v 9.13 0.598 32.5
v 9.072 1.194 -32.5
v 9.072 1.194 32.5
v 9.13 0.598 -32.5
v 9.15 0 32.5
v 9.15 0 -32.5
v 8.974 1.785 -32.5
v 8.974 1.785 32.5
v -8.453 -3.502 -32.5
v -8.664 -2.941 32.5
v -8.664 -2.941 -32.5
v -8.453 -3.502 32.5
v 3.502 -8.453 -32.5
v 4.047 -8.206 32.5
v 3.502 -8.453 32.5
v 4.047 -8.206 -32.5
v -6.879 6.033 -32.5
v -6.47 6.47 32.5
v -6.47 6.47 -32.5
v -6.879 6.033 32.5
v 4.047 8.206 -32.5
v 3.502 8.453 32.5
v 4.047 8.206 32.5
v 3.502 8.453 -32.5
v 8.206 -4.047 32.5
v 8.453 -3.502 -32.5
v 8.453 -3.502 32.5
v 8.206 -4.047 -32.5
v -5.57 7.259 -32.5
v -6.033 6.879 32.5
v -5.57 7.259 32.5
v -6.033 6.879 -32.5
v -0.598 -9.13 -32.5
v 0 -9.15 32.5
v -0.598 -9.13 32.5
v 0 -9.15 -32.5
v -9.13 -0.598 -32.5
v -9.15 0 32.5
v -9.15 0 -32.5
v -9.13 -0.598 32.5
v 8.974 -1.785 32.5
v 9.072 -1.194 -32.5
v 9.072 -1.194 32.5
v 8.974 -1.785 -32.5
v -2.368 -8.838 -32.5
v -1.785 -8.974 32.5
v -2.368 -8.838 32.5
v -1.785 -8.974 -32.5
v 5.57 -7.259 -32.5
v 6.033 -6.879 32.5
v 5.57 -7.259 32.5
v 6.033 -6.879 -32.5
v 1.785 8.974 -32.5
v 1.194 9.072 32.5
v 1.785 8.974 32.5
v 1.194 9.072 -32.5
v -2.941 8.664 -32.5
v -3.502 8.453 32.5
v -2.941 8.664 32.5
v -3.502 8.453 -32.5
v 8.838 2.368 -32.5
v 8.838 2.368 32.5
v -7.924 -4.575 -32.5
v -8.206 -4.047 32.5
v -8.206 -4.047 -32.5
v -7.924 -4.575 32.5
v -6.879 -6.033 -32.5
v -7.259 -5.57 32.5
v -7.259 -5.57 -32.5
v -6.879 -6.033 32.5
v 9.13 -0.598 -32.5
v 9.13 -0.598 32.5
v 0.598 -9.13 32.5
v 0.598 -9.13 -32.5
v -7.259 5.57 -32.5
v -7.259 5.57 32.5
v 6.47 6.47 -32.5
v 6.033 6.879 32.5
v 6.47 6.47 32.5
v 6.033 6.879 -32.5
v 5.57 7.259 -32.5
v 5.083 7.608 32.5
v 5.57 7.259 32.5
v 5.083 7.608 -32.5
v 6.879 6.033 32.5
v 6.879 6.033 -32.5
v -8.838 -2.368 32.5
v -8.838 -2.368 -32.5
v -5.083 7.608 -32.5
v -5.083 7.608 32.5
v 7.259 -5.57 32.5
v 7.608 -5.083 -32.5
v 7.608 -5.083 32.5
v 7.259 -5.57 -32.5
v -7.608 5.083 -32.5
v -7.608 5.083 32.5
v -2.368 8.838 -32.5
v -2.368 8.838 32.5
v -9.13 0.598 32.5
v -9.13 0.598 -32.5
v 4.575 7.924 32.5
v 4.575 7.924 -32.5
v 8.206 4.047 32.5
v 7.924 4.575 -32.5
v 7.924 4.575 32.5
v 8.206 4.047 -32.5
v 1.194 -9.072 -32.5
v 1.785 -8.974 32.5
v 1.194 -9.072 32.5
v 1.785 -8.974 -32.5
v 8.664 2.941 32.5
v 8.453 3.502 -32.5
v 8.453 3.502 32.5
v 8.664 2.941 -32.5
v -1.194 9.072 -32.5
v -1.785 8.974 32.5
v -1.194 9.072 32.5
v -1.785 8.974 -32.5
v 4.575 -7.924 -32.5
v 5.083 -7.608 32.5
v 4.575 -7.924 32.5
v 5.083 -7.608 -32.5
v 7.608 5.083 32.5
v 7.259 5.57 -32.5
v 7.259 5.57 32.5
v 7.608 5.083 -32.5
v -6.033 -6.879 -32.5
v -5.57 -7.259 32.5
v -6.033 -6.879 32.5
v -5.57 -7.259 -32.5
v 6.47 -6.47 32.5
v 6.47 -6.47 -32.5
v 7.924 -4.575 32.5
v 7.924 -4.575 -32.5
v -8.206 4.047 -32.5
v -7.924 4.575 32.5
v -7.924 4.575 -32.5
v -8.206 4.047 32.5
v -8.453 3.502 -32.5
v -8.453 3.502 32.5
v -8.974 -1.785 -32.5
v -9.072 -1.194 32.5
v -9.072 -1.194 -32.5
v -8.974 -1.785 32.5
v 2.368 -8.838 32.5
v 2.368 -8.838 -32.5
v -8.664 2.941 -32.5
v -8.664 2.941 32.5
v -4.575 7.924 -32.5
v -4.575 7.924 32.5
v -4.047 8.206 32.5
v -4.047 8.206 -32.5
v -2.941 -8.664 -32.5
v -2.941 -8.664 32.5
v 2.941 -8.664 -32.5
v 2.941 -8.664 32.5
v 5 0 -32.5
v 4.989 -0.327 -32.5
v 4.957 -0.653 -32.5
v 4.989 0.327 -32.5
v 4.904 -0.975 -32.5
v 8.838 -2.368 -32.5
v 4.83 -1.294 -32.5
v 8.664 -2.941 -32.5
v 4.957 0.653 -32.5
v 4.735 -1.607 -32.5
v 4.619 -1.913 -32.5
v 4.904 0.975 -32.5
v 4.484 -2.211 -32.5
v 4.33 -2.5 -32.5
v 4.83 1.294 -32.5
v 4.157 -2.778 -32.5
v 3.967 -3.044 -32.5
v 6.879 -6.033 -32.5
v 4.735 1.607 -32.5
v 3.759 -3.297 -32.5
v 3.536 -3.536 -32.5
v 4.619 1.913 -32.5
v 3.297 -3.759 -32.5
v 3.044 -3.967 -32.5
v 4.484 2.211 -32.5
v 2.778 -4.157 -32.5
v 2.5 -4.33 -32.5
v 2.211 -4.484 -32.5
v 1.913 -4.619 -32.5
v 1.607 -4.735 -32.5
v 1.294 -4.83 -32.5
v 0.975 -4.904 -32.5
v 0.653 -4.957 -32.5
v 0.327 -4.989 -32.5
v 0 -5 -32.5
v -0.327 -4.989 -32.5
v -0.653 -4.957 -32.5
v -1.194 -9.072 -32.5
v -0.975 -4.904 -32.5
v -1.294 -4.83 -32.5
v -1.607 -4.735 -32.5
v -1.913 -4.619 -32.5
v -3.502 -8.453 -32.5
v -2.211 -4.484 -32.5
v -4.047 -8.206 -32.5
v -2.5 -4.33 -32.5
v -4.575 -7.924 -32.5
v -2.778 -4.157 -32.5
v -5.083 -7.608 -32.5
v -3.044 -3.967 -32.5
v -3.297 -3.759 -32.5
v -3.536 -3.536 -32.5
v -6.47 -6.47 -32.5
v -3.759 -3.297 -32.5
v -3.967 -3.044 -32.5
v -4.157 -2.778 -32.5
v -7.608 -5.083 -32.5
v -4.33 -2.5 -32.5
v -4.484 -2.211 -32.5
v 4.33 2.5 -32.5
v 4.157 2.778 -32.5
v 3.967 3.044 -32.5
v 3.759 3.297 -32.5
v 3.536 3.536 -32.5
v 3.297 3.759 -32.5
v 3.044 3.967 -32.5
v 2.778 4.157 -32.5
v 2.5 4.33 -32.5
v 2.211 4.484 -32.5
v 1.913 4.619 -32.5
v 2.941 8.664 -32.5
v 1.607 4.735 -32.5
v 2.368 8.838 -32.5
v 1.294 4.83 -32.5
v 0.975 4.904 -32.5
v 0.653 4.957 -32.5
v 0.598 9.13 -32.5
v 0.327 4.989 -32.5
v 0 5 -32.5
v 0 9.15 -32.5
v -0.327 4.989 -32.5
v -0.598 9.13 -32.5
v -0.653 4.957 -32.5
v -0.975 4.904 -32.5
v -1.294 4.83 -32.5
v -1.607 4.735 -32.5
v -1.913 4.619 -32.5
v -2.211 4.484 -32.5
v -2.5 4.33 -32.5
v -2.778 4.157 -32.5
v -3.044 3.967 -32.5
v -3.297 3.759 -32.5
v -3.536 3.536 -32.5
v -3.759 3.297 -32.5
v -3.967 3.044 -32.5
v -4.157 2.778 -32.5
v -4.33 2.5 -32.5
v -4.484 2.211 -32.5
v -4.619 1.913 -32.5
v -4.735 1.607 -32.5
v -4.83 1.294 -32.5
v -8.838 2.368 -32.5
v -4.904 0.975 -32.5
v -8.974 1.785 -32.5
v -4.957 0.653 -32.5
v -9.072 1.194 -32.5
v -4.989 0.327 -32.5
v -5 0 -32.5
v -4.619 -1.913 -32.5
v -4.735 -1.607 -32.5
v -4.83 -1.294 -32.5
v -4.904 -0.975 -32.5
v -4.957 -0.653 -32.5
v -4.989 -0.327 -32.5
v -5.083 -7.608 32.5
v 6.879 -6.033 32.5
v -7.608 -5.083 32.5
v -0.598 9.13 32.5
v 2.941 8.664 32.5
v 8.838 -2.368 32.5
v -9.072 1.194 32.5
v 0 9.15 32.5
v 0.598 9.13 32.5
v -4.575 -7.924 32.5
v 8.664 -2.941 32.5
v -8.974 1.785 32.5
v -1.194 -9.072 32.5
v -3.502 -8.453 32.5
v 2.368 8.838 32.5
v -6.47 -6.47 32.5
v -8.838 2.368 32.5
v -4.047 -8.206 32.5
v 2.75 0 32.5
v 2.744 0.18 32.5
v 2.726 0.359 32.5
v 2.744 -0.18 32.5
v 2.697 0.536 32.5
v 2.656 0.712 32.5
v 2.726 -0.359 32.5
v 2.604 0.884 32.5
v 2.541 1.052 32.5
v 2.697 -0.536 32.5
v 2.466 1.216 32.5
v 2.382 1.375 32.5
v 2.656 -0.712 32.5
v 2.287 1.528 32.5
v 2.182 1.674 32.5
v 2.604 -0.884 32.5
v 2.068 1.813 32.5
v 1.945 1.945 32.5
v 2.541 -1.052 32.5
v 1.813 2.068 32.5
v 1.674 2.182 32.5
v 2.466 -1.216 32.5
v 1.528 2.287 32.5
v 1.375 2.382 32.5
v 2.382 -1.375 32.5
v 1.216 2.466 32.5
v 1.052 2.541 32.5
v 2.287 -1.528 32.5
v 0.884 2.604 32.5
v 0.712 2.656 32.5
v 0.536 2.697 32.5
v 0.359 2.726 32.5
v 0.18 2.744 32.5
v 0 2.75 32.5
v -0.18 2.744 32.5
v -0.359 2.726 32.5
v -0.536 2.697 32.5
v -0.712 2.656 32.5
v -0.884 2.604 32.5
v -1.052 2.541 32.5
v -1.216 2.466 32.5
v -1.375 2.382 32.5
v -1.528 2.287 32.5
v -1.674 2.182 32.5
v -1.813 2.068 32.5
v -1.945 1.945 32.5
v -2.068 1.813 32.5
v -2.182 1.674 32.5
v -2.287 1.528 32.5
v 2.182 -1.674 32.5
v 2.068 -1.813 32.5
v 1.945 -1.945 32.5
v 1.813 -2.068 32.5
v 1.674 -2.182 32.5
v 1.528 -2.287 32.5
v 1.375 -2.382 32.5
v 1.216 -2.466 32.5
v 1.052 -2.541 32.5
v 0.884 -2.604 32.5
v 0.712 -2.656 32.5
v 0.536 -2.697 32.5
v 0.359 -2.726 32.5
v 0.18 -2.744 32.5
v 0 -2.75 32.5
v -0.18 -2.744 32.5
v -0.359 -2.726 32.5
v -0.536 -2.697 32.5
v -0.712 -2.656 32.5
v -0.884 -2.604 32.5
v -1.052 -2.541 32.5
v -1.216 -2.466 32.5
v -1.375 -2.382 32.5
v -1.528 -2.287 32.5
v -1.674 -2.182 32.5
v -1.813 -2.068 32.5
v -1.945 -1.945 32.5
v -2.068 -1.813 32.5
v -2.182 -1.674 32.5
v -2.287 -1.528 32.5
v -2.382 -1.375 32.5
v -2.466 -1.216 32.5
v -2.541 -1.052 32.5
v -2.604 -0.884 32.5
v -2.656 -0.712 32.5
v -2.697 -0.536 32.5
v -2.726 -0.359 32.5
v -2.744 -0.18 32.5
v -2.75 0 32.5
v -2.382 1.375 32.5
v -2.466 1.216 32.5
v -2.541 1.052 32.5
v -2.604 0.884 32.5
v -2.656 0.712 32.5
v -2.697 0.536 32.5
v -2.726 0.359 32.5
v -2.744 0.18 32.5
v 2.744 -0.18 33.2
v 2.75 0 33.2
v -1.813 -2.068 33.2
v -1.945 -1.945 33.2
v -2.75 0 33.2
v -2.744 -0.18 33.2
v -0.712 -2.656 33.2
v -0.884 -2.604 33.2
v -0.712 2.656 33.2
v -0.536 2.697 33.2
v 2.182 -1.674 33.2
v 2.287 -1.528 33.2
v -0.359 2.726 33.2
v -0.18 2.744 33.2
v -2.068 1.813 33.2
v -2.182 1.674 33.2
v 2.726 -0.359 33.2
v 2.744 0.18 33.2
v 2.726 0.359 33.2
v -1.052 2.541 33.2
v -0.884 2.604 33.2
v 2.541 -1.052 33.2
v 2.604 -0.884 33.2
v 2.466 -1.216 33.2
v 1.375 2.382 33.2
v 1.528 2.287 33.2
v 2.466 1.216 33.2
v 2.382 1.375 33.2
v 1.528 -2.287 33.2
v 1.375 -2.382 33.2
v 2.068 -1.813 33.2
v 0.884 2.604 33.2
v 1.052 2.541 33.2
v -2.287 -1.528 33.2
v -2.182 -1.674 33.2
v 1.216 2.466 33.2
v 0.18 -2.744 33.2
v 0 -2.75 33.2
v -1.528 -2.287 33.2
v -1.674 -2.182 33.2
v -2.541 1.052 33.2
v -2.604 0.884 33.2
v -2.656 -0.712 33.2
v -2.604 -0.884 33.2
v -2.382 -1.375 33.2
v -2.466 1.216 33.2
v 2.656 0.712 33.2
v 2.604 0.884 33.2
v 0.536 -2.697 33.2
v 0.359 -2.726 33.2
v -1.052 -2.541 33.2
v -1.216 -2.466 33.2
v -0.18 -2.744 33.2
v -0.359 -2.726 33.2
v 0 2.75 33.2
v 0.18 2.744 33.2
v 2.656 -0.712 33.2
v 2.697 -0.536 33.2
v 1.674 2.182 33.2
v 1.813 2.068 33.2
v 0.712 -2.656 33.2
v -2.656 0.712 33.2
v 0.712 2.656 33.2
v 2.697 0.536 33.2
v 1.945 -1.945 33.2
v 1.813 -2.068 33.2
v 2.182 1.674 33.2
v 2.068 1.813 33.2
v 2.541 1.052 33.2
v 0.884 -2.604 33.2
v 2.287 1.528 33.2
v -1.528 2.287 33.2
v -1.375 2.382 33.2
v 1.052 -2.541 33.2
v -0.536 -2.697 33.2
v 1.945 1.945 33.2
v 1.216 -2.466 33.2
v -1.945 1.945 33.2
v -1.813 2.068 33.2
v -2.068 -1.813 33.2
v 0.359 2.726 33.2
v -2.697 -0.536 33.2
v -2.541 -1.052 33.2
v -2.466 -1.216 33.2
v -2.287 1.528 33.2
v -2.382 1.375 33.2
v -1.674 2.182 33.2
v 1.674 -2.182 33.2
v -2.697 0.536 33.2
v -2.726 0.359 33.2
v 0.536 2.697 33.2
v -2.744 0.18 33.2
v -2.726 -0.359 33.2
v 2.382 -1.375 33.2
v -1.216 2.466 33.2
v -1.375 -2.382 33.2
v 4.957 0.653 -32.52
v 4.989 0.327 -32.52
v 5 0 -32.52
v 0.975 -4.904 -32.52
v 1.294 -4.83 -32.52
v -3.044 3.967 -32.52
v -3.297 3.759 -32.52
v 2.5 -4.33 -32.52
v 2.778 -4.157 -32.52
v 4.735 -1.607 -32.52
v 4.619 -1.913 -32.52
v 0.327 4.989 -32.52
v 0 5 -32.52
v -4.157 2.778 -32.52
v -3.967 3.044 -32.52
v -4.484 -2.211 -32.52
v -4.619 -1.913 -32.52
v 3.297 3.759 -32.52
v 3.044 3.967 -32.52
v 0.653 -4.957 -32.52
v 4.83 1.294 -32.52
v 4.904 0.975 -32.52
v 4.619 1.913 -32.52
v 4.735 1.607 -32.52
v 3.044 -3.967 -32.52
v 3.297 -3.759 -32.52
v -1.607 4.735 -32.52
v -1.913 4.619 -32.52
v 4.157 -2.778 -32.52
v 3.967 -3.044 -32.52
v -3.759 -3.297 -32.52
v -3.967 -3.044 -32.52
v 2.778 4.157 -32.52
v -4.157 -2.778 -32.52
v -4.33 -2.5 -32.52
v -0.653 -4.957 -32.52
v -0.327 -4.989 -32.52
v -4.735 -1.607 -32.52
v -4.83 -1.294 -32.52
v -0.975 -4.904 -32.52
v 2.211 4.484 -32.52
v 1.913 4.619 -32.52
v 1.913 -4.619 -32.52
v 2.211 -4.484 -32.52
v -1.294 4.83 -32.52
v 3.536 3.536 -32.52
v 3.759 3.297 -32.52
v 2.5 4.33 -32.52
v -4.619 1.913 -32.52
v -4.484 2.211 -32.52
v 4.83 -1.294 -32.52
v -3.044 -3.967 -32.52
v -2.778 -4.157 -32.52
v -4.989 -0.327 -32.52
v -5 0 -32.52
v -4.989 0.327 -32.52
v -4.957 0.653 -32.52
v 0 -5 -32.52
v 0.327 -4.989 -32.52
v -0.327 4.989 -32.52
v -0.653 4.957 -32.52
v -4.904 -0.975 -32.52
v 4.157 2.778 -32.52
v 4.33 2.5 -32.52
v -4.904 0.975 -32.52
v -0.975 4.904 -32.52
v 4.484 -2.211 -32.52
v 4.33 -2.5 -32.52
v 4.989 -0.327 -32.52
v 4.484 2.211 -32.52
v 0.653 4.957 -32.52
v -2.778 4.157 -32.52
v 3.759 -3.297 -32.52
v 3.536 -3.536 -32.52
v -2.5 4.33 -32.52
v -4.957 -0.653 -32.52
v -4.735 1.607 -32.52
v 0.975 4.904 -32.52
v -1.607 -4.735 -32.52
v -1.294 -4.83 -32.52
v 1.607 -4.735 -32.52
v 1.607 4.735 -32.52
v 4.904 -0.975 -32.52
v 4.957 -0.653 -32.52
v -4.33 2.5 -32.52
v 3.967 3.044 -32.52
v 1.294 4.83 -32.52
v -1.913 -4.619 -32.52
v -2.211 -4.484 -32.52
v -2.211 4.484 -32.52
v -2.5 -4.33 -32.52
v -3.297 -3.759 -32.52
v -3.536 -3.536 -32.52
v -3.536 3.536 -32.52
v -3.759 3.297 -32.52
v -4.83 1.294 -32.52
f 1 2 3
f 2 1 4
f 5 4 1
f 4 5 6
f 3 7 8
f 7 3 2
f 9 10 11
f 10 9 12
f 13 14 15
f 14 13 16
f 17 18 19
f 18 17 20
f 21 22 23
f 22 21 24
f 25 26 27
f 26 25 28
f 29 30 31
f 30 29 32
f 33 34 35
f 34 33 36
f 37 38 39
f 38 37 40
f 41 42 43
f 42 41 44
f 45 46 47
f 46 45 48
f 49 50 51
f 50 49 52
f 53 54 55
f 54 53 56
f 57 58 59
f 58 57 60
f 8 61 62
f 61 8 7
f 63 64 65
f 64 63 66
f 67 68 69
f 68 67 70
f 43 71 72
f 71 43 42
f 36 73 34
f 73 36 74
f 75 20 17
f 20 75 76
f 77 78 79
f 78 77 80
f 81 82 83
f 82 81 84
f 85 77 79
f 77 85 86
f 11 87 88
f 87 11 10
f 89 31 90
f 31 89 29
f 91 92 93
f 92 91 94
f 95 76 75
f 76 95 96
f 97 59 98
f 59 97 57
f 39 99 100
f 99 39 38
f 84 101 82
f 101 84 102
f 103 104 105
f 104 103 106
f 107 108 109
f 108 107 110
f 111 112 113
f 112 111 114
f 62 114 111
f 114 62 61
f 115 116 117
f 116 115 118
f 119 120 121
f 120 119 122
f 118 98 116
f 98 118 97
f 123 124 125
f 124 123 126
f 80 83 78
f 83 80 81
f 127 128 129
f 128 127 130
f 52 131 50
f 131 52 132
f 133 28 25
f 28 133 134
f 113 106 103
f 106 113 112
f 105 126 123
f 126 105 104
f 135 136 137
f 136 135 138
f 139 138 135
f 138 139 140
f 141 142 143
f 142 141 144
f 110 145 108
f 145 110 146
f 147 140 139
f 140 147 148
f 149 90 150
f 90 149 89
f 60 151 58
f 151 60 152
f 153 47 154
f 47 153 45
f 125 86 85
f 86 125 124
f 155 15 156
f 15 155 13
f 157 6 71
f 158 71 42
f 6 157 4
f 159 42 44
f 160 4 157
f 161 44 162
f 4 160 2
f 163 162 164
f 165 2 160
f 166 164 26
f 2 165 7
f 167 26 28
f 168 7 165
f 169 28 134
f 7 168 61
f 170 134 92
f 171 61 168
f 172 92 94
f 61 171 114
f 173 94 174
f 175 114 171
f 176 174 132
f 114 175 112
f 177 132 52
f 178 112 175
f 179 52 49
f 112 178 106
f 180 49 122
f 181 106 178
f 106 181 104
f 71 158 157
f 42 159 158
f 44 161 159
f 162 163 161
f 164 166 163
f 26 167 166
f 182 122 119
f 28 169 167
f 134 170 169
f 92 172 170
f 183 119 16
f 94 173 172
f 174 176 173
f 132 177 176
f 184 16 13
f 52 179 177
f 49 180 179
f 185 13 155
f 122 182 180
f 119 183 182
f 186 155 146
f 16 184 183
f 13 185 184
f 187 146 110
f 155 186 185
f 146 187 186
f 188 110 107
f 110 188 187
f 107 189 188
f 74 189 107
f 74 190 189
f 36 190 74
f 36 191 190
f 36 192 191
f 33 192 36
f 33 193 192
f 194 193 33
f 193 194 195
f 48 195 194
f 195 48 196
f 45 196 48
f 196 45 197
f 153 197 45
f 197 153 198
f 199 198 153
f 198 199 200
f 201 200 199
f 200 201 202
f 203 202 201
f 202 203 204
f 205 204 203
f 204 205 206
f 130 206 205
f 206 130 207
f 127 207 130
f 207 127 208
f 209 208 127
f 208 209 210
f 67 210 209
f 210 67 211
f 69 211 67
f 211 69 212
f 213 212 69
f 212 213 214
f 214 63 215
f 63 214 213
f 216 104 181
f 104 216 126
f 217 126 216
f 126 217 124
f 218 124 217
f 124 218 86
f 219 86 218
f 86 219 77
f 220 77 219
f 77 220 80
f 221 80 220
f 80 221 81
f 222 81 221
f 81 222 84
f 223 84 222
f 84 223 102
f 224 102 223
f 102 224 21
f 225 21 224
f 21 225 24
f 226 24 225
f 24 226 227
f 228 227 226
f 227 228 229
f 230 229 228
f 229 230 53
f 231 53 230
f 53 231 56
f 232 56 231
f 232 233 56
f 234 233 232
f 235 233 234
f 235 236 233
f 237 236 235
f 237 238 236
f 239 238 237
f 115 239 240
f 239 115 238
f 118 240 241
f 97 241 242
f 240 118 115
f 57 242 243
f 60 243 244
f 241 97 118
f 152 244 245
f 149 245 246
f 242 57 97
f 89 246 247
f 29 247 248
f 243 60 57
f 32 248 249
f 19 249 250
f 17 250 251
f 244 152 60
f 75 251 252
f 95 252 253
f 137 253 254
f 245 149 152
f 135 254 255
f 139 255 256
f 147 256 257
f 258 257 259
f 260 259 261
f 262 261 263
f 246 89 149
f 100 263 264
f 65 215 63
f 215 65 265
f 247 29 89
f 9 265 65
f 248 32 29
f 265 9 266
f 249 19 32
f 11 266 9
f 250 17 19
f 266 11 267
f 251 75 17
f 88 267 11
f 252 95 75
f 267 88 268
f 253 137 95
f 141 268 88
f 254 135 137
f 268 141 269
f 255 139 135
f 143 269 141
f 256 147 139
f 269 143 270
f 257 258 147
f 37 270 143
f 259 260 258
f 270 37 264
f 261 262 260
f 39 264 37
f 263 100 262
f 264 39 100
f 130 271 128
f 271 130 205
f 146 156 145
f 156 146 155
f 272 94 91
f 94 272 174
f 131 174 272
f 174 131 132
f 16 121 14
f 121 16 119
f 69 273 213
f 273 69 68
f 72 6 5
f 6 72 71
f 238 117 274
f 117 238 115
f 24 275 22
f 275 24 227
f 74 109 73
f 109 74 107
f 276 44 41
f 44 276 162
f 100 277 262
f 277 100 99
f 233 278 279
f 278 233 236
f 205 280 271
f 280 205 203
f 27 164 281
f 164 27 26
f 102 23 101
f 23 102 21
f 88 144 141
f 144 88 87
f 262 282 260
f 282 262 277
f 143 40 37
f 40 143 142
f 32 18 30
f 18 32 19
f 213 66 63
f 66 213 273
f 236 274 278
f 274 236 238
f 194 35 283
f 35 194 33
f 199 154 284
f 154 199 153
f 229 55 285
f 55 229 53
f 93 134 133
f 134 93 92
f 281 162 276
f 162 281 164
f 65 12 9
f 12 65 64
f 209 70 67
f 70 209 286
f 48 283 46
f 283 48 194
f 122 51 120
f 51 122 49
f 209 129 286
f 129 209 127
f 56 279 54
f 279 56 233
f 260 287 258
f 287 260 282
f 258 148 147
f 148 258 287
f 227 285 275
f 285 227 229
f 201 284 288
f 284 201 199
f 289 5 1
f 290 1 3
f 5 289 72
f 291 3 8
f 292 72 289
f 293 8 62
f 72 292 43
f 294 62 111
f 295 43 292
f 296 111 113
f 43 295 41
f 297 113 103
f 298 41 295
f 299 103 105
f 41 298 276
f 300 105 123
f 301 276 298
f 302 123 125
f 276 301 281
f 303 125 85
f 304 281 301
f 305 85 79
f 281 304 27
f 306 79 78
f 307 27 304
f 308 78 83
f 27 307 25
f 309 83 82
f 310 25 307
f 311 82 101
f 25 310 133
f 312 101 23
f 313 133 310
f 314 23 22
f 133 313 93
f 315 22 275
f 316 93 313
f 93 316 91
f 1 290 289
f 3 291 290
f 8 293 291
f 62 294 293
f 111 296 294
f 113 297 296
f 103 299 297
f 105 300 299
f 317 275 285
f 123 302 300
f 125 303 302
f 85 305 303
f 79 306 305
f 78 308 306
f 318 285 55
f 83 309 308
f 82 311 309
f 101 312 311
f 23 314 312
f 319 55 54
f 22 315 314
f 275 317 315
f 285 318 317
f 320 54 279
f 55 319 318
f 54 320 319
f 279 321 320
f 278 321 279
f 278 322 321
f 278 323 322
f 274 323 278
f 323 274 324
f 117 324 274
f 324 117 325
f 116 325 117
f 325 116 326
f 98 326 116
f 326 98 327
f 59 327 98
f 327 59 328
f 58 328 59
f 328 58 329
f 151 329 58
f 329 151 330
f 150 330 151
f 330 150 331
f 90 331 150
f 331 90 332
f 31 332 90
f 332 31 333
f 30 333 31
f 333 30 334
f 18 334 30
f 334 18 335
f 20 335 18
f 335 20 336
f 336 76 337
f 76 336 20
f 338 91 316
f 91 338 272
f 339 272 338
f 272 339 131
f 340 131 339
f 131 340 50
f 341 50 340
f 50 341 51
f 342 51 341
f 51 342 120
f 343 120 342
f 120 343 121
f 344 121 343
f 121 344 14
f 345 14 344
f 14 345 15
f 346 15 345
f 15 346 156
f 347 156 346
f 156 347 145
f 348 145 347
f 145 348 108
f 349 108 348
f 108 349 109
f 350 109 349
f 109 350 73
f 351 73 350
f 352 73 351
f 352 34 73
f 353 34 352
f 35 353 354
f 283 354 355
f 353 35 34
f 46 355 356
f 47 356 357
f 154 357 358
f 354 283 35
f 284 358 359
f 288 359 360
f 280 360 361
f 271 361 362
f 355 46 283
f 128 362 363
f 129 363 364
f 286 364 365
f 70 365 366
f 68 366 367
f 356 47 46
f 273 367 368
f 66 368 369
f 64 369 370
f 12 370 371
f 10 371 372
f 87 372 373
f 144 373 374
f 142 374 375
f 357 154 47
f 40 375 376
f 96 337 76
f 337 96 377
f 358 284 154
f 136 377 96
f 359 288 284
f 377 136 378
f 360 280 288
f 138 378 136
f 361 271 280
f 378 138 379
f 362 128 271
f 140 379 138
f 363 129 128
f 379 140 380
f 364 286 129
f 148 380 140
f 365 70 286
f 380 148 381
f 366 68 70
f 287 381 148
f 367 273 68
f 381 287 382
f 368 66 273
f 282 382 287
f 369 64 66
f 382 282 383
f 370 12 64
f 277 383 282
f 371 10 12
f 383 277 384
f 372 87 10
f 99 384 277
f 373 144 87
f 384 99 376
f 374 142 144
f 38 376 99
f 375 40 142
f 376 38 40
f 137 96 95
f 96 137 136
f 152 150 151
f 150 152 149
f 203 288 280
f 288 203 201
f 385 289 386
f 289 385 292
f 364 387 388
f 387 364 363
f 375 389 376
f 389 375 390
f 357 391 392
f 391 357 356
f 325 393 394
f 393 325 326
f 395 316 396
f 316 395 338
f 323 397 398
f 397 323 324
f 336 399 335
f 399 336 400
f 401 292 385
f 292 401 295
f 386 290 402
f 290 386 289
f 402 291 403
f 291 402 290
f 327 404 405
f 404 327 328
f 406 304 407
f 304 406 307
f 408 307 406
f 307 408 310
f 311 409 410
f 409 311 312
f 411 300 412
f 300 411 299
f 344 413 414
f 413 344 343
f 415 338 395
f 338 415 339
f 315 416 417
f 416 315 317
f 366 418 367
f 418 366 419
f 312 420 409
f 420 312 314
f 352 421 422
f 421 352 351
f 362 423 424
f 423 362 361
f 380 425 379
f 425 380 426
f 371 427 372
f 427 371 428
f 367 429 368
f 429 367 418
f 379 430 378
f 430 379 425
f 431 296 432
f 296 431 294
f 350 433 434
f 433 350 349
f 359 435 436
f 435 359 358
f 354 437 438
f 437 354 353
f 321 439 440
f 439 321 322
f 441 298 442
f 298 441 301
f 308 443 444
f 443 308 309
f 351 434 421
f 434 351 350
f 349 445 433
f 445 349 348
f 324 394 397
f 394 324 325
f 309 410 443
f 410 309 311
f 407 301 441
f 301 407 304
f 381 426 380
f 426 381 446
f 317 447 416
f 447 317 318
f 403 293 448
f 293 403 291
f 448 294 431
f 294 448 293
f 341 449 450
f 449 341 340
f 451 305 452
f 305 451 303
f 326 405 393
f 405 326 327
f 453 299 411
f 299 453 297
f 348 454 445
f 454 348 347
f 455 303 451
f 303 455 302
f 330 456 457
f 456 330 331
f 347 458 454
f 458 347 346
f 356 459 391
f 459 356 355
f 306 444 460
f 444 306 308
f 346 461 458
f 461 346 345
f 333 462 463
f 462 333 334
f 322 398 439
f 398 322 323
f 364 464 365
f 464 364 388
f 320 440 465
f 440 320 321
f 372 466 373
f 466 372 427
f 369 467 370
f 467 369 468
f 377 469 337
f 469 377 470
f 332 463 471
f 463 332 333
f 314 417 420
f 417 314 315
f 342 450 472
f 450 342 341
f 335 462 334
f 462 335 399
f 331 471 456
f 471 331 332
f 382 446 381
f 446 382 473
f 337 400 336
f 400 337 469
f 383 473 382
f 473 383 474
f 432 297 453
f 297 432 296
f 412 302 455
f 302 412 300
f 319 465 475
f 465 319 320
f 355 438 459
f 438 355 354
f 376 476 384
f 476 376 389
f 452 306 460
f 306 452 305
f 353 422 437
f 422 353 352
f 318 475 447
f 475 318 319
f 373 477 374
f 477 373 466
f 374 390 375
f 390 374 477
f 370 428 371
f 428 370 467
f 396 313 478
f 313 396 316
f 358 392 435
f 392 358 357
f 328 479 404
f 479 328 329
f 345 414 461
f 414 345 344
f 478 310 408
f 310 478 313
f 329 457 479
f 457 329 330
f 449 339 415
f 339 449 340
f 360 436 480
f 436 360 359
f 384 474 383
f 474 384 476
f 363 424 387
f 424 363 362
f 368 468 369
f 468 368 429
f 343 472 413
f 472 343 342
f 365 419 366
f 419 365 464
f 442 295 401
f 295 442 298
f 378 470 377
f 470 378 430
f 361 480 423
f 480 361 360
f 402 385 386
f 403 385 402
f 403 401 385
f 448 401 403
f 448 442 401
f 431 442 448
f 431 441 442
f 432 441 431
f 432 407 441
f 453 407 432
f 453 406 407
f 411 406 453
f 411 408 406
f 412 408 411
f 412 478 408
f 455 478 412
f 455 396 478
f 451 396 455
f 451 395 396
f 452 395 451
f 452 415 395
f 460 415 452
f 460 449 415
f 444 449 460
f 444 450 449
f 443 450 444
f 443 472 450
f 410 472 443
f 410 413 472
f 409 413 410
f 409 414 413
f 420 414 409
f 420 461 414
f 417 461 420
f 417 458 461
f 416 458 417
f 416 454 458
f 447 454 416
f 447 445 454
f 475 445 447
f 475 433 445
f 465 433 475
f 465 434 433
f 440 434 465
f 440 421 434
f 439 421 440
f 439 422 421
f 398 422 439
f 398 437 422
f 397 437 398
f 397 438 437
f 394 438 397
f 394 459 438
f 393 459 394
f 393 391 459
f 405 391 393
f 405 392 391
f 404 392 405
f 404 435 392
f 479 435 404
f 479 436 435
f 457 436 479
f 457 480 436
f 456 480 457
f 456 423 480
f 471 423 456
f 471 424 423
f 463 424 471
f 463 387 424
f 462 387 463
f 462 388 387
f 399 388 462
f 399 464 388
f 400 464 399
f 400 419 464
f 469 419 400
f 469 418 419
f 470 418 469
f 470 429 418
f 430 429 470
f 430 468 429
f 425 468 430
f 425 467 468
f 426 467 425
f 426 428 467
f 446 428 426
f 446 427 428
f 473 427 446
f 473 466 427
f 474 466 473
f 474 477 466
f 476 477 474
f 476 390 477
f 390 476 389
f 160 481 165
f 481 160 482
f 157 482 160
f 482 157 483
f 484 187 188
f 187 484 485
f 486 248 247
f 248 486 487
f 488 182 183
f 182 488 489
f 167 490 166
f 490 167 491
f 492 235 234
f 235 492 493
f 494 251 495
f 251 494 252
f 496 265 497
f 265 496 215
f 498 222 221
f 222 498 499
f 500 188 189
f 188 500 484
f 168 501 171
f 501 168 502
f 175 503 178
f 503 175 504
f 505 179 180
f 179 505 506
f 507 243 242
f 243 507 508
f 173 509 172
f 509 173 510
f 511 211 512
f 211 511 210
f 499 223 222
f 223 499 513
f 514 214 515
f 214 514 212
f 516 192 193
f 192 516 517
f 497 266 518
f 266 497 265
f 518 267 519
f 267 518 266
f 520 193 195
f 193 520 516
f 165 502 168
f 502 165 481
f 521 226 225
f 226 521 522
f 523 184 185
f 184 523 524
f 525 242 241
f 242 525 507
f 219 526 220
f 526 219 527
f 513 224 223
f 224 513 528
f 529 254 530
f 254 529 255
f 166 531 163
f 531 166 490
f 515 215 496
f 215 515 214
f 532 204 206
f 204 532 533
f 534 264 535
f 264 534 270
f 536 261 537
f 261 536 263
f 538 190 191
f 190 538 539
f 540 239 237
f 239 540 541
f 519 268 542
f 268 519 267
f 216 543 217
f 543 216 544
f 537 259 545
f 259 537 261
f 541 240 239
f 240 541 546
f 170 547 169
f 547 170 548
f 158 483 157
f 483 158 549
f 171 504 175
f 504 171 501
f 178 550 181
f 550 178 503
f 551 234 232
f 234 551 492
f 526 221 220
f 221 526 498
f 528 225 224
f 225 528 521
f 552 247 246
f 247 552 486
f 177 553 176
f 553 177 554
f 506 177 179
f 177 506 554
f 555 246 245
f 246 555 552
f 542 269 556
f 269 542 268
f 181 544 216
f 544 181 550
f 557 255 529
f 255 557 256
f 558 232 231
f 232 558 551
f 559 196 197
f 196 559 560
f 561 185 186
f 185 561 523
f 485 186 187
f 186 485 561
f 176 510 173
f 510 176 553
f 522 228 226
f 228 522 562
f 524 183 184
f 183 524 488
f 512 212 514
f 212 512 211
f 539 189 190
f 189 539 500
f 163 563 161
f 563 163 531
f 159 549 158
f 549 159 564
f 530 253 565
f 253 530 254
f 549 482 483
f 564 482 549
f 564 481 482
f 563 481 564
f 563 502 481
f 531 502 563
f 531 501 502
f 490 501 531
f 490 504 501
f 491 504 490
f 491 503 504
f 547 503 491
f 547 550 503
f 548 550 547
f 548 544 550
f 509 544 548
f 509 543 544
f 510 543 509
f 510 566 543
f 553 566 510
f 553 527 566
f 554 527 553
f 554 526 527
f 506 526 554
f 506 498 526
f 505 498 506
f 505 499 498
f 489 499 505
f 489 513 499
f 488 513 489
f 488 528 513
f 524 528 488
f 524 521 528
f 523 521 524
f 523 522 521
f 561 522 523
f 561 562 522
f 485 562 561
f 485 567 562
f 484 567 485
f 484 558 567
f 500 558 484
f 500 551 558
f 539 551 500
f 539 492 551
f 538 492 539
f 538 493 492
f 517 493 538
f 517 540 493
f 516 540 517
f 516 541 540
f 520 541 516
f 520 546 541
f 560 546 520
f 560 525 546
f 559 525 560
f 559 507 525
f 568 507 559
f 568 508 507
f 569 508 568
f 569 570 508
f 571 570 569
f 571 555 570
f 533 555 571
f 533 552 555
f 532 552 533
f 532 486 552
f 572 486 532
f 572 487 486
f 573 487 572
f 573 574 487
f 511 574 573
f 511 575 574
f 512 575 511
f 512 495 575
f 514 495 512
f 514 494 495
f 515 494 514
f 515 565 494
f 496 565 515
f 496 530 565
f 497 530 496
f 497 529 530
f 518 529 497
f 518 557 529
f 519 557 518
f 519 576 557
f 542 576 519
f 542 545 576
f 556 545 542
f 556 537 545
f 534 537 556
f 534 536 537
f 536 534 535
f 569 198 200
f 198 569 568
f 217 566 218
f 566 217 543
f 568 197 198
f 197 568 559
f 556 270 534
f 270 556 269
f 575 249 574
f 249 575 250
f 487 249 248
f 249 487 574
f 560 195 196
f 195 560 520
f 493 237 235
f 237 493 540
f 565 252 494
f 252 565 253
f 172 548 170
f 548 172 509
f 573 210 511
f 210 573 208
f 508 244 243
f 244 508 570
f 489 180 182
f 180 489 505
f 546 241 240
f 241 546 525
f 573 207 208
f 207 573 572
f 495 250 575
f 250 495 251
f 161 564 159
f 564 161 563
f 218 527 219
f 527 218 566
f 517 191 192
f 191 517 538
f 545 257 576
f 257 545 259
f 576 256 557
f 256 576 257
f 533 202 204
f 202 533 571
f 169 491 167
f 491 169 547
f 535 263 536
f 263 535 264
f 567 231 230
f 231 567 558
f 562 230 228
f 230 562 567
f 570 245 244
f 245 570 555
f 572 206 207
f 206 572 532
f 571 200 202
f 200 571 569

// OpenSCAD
// Battery cell: 65.0mm tall, 18.3mm diameter (single connected solid)

// Parameters
height_mm = 65.0;                     //[32.5:130:0.1]
diameter_mm = 18.3;                   //[9.15:36.6:0.1]

positive_terminal_diameter_mm = 5.5;  //[2.75:11:0.1]
positive_terminal_height_mm   = 1.5;  //[0.75:3:0.1]

negative_terminal_diameter_mm = 10.0; //[5:20:0.1]
negative_terminal_height_mm   = 0.2;  //[0.1:0.6:0.05]

terminal_overlap_mm = 0.8;            //[0.2:2:0.1]

$fn = 96;

module battery() {
    body_r = diameter_mm/2;
    pos_r  = positive_terminal_diameter_mm/2;
    neg_r  = negative_terminal_diameter_mm/2;

    // Ensure overlap is valid so parts always intersect the body
    ov_pos = min(terminal_overlap_mm, positive_terminal_height_mm*0.9);
    ov_neg = min(terminal_overlap_mm, negative_terminal_height_mm*0.9);

    union() {
        // Main cylindrical body (centered)
        cylinder(h=height_mm, r=body_r, center=true);

        // Positive terminal (top), overlaps into body
        translate([0, 0, height_mm/2 + positive_terminal_height_mm/2 - ov_pos])
            cylinder(h=positive_terminal_height_mm, r=pos_r, center=true);

        // Negative terminal (bottom), overlaps into body
        translate([0, 0, -height_mm/2 - negative_terminal_height_mm/2 + ov_neg])
            cylinder(h=negative_terminal_height_mm, r=neg_r, center=true);
    }
}

battery();
